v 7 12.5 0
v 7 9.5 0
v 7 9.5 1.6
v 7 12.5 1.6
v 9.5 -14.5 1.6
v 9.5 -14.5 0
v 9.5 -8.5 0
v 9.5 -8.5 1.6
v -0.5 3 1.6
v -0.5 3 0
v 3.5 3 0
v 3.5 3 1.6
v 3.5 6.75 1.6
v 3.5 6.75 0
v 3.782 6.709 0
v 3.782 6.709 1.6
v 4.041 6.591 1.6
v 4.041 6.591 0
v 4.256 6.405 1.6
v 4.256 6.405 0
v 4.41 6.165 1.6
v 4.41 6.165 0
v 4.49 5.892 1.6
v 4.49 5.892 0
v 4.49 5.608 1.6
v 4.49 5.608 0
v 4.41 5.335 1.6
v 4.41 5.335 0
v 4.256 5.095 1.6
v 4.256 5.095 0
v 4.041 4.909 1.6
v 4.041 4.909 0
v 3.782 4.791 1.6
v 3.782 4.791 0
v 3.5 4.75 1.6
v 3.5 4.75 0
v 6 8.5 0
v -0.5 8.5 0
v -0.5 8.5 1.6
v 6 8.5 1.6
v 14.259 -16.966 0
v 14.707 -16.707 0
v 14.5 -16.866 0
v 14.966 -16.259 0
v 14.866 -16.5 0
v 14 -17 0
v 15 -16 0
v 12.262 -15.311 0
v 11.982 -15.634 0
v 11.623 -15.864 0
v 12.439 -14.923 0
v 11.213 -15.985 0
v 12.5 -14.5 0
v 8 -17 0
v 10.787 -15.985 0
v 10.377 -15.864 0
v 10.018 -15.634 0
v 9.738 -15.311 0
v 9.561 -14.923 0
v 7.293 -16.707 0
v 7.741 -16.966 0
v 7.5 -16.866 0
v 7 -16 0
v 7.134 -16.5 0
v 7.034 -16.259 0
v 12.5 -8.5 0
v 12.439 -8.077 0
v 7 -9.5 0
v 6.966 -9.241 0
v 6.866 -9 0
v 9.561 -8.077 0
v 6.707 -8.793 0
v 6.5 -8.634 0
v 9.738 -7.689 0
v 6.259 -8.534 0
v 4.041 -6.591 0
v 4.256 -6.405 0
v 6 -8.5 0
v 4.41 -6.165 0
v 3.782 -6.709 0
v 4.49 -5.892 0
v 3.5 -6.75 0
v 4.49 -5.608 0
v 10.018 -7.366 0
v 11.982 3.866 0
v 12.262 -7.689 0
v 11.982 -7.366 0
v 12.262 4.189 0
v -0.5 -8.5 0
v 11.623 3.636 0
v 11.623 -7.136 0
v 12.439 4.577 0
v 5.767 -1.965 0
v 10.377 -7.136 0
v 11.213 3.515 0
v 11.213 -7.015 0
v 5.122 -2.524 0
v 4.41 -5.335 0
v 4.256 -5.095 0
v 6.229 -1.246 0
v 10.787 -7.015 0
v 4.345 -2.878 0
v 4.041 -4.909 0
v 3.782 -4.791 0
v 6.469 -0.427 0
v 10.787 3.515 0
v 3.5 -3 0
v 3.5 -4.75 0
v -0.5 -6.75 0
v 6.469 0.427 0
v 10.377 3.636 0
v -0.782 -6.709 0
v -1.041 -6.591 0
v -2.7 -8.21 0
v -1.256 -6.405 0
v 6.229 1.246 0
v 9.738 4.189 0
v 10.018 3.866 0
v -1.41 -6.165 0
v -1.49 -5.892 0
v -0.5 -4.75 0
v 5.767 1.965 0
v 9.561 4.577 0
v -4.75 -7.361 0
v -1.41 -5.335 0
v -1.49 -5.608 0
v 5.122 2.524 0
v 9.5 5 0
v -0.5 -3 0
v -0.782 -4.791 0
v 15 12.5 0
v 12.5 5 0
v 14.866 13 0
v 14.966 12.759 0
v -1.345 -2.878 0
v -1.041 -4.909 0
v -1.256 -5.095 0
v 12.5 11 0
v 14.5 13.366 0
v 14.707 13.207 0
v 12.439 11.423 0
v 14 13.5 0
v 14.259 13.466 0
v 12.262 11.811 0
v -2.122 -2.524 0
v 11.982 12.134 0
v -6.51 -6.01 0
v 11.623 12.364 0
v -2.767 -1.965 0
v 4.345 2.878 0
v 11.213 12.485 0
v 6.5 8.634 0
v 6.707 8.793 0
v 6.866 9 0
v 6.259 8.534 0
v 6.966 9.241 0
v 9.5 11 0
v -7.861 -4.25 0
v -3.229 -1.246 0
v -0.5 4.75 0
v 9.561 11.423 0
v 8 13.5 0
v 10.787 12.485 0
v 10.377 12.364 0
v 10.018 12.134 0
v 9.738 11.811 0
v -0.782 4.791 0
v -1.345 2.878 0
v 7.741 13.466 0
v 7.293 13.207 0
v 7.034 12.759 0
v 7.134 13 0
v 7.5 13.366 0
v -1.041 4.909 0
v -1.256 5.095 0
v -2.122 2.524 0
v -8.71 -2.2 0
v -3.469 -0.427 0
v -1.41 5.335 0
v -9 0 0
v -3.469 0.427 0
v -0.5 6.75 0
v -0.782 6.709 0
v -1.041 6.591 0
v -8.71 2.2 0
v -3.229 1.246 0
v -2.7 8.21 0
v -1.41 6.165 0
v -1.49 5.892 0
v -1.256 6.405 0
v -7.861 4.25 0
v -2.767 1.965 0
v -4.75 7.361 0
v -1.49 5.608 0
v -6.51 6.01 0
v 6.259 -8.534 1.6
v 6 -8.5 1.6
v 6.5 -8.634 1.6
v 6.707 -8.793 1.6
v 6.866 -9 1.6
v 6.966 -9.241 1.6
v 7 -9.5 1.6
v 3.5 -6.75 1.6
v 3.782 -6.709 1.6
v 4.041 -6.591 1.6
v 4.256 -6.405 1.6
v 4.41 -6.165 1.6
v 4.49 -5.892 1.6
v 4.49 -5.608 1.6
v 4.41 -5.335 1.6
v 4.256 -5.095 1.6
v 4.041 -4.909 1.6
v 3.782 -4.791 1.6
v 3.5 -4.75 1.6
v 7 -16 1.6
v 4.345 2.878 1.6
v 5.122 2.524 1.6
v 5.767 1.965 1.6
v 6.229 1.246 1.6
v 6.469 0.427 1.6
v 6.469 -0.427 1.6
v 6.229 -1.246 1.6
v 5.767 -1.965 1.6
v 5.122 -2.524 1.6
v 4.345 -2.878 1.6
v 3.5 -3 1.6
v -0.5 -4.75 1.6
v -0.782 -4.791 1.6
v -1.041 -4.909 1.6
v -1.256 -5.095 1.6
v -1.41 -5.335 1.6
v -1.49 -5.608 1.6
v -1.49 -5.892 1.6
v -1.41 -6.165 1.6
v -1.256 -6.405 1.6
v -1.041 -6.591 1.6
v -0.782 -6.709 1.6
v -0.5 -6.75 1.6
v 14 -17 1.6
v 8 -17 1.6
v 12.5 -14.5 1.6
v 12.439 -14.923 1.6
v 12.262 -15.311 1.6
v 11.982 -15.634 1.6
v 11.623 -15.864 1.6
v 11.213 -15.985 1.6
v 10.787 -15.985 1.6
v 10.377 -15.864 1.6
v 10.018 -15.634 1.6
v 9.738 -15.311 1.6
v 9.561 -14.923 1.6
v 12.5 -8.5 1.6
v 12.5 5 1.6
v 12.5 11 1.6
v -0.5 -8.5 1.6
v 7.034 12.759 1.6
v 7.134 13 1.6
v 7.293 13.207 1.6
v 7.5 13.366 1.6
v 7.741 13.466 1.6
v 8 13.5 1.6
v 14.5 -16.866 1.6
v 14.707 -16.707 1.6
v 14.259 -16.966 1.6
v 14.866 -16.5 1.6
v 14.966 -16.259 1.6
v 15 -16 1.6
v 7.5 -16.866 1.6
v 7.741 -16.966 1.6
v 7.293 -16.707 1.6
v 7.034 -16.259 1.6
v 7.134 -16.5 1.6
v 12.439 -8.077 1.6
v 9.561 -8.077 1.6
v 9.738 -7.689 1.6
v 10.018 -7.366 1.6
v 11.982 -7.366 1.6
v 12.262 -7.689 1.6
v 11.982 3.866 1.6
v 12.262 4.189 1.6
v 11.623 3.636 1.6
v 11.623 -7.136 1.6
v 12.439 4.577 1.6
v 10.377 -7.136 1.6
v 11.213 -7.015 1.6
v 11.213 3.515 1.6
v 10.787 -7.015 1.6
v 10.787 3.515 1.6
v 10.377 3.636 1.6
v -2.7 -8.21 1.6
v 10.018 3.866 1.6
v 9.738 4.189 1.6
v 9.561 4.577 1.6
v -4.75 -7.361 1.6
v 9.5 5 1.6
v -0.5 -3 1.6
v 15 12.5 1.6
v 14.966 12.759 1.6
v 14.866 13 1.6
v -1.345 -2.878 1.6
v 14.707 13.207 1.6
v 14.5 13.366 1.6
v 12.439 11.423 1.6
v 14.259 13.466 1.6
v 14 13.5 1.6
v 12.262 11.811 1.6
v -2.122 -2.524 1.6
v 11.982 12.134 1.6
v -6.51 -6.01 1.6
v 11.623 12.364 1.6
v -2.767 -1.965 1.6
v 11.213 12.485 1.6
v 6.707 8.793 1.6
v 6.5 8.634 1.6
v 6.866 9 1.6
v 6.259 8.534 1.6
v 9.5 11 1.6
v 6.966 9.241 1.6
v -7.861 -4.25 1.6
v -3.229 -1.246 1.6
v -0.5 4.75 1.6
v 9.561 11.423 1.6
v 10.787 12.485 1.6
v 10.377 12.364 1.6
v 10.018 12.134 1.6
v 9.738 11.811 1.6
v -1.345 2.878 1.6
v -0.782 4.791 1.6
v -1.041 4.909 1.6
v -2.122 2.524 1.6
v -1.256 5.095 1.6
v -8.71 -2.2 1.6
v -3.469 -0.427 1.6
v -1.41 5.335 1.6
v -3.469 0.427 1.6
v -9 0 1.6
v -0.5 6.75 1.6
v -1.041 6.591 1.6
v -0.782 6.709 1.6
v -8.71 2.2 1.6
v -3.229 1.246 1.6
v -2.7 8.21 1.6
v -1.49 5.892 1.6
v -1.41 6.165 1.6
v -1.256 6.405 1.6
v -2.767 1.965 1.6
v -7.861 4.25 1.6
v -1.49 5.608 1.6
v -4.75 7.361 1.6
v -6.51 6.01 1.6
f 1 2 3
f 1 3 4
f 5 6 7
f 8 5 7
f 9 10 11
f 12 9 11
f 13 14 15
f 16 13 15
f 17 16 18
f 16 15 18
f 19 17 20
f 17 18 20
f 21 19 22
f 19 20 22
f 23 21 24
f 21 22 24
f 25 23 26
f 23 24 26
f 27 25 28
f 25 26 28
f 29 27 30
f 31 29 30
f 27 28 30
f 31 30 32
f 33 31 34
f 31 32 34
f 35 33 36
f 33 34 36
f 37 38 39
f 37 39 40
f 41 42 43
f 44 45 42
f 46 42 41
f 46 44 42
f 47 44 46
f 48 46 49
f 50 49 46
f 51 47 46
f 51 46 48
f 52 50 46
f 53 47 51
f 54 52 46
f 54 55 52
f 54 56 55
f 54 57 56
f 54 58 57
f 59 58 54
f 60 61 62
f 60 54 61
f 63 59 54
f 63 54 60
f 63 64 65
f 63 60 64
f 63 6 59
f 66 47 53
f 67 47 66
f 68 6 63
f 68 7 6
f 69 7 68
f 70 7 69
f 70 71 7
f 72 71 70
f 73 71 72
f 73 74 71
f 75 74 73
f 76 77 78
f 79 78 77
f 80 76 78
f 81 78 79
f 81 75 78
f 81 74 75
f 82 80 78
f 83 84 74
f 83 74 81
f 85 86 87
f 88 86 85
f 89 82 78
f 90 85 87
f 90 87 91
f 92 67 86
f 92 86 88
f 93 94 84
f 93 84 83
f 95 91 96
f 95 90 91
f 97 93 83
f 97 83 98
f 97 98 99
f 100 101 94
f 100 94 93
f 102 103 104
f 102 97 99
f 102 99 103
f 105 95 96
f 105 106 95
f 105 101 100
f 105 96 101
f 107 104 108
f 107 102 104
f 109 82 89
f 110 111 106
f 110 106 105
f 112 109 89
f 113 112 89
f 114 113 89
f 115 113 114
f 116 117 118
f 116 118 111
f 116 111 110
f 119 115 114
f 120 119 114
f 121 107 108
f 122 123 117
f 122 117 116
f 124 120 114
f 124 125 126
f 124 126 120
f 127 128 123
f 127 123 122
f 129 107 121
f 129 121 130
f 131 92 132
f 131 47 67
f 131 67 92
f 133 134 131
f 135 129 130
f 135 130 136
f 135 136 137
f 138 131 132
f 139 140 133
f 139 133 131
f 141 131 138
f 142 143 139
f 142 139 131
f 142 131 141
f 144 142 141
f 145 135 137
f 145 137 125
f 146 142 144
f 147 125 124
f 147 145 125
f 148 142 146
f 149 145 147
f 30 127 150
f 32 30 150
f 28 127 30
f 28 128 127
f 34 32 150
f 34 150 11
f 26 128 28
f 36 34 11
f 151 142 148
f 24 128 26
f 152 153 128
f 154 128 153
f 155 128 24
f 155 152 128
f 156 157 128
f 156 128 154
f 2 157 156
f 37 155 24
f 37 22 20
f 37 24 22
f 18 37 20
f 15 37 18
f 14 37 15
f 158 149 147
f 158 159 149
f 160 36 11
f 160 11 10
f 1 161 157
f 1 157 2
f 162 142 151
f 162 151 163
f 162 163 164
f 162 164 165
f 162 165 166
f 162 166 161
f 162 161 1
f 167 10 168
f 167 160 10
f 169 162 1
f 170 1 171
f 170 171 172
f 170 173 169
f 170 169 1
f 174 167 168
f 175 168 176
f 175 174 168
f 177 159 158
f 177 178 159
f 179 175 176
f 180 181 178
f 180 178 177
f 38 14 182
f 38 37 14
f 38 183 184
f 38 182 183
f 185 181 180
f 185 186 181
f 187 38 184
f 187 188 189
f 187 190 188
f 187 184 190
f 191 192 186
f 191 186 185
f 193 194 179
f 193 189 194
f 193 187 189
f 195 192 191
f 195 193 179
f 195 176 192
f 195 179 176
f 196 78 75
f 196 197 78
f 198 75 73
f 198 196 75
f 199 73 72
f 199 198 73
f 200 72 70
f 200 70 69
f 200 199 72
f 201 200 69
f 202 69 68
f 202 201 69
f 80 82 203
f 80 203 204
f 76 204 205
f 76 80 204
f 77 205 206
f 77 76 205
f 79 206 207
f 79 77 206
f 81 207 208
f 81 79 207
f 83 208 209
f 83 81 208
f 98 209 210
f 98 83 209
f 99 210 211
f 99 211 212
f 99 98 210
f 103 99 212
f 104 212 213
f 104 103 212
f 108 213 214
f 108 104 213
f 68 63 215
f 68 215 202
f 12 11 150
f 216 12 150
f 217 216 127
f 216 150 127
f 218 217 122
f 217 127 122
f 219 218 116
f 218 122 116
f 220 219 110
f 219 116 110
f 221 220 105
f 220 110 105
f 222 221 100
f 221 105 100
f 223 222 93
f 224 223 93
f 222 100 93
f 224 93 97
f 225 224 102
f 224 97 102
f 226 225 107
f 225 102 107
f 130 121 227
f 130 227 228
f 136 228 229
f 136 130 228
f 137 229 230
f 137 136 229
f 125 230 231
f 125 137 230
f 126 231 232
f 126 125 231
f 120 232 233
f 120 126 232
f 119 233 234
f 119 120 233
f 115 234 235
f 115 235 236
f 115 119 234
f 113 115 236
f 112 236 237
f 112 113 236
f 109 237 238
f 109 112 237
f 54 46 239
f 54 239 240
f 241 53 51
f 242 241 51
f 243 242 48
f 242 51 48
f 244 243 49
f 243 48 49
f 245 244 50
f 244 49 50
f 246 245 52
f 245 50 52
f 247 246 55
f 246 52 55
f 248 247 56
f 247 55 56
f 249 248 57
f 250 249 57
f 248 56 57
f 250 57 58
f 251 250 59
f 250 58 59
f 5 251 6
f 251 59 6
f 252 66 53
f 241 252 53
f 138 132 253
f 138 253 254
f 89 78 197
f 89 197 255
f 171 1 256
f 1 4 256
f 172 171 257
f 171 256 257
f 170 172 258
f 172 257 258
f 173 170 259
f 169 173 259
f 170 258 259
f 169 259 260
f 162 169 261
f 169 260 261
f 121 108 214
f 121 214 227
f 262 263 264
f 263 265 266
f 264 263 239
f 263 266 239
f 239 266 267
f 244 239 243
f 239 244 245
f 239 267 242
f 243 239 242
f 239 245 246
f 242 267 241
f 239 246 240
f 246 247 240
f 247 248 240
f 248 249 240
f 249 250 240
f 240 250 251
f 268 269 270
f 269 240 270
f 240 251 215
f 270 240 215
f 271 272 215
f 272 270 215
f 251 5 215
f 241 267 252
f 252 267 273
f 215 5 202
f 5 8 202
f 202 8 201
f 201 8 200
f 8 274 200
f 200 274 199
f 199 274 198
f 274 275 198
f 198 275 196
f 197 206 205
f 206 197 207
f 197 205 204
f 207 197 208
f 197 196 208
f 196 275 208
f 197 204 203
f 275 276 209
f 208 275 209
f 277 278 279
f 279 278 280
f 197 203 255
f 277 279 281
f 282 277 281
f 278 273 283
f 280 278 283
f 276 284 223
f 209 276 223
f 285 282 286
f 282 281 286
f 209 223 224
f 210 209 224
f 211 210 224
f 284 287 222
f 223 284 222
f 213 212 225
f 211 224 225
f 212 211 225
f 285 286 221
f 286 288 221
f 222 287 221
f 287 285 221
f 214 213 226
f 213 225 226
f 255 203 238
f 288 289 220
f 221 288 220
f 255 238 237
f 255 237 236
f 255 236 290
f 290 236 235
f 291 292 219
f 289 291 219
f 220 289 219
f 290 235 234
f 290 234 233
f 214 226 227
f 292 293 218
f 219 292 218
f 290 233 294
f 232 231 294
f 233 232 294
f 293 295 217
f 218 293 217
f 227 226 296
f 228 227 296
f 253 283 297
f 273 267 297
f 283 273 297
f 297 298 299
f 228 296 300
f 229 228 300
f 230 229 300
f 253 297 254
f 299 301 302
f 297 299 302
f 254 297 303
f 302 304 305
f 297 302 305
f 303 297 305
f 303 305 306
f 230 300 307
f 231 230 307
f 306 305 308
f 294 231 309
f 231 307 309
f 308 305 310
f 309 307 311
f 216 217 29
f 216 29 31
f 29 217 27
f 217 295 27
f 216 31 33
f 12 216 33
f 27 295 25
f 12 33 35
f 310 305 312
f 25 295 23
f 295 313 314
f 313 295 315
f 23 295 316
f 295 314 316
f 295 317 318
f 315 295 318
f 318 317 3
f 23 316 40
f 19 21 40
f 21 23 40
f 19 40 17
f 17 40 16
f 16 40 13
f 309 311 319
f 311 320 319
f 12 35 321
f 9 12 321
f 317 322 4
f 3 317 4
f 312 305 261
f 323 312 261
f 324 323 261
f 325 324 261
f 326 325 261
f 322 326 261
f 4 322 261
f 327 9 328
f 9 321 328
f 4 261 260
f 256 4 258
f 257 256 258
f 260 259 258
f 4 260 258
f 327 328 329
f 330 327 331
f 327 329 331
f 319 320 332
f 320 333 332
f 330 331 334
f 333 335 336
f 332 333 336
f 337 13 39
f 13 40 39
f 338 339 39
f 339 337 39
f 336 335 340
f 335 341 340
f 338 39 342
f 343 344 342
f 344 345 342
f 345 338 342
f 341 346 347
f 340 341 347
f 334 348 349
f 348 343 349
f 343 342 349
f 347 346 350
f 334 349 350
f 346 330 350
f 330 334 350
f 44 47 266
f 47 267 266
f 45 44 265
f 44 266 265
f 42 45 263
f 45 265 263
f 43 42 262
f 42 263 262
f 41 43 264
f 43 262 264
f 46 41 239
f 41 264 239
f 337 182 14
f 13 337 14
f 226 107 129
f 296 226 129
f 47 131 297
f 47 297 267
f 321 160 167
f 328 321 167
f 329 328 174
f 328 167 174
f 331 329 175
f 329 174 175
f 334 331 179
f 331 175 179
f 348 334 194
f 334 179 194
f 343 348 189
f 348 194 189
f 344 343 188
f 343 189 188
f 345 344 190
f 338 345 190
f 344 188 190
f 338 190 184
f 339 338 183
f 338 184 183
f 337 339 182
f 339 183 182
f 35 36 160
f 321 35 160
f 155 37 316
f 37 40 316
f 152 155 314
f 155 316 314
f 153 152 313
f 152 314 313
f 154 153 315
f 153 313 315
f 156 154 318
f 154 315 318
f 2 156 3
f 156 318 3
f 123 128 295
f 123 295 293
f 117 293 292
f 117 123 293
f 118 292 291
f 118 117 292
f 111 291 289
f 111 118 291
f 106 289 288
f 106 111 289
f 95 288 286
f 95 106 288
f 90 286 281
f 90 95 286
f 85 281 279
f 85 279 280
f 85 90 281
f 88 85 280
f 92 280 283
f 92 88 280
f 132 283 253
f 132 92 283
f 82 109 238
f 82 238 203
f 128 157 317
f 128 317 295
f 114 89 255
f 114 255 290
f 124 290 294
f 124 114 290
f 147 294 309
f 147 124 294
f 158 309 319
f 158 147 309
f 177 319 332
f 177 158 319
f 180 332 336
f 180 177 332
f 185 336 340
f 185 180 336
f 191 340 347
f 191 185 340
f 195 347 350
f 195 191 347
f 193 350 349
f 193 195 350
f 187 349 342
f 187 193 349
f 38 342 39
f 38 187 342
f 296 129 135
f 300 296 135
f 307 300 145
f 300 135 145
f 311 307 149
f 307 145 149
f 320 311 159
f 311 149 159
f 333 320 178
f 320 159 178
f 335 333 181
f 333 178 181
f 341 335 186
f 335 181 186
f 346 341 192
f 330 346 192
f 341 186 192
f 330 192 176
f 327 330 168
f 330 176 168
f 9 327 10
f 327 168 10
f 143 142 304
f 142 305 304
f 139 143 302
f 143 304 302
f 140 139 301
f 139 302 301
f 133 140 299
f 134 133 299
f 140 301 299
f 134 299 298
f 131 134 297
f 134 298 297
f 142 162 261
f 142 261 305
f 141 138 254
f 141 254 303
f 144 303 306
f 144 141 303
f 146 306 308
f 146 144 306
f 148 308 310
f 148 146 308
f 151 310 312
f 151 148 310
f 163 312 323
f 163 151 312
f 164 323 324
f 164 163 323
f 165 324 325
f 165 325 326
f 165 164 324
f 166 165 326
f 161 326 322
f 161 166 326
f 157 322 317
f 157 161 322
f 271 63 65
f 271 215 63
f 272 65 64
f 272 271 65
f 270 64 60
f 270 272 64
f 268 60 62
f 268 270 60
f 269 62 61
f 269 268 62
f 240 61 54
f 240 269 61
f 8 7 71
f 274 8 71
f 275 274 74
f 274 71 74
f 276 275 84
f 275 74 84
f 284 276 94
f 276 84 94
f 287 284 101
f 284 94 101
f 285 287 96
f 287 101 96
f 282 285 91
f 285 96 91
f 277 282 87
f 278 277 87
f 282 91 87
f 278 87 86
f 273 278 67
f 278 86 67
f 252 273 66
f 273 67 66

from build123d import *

# Parameters (mm, degrees)
EXTRUDE_1_DEPTH = 1.6
FILLET_1_R      = 1


with BuildPart() as part:
    # 草图1 → 凸台-拉伸1 (new body)
    with BuildSketch(Plane.XY):
        with BuildLine():
            Line((-0.5, 8.5), (7, 8.5))
            Line((7, 8.5), (7, 13.5))
            Line((7, 13.5), (15, 13.5))
            Line((15, 13.5), (15, -17))
            Line((15, -17), (7, -17))
            Line((7, -17), (7, -8.5))
            Line((7, -8.5), (-0.5, -8.5))
            ThreePointArc((-0.5, -8.5), (-9, 0), (-0.5, 8.5))
        make_face()
        with BuildLine():
            Line((-0.5, 3), (3.5, 3))
            ThreePointArc((3.5, 3), (6.5, 0), (3.5, -3))
            Line((3.5, -3), (-0.5, -3))
            ThreePointArc((-0.5, -3), (-3.5, 0), (-0.5, 3))
        make_face(mode=Mode.SUBTRACT)
        with BuildLine():
            Line((-0.5, 6.75), (3.5, 6.75))
            ThreePointArc((3.5, 6.75), (4.5, 5.75), (3.5, 4.75))
            Line((3.5, 4.75), (-0.5, 4.75))
            ThreePointArc((-0.5, 4.75), (-1.5, 5.75), (-0.5, 6.75))
        make_face(mode=Mode.SUBTRACT)
        with BuildLine():
            Line((-0.5, -6.75), (3.5, -6.75))
            ThreePointArc((3.5, -6.75), (4.5, -5.75), (3.5, -4.75))
            Line((3.5, -4.75), (-0.5, -4.75))
            ThreePointArc((-0.5, -4.75), (-1.5, -5.75), (-0.5, -6.75))
        make_face(mode=Mode.SUBTRACT)
        with BuildLine():
            Line((12.5, -8.5), (12.5, -14.5))
            ThreePointArc((12.5, -14.5), (11, -16), (9.5, -14.5))
            Line((9.5, -14.5), (9.5, -8.5))
            ThreePointArc((9.5, -8.5), (11, -7), (12.5, -8.5))
        make_face(mode=Mode.SUBTRACT)
        with BuildLine():
            Line((12.5, 5), (12.5, 11))
            ThreePointArc((12.5, 11), (11, 12.5), (9.5, 11))
            Line((9.5, 11), (9.5, 5))
            ThreePointArc((9.5, 5), (11, 3.5), (12.5, 5))
        make_face(mode=Mode.SUBTRACT)
    extrude(amount=EXTRUDE_1_DEPTH)

    # 圆角1
    fillet_1_edges = [part.edges().sort_by_distance(p)[0] for p in [
        (7, 8.5, 0.8),
        (7, 13.5, 0.8),
        (15, 13.5, 0.8),
        (15, -17, 0.8),
        (7, -17, 0.8),
        (7, -8.5, 0.8),
    ]]
    fillet(fillet_1_edges, radius=FILLET_1_R)


solid = part.part
